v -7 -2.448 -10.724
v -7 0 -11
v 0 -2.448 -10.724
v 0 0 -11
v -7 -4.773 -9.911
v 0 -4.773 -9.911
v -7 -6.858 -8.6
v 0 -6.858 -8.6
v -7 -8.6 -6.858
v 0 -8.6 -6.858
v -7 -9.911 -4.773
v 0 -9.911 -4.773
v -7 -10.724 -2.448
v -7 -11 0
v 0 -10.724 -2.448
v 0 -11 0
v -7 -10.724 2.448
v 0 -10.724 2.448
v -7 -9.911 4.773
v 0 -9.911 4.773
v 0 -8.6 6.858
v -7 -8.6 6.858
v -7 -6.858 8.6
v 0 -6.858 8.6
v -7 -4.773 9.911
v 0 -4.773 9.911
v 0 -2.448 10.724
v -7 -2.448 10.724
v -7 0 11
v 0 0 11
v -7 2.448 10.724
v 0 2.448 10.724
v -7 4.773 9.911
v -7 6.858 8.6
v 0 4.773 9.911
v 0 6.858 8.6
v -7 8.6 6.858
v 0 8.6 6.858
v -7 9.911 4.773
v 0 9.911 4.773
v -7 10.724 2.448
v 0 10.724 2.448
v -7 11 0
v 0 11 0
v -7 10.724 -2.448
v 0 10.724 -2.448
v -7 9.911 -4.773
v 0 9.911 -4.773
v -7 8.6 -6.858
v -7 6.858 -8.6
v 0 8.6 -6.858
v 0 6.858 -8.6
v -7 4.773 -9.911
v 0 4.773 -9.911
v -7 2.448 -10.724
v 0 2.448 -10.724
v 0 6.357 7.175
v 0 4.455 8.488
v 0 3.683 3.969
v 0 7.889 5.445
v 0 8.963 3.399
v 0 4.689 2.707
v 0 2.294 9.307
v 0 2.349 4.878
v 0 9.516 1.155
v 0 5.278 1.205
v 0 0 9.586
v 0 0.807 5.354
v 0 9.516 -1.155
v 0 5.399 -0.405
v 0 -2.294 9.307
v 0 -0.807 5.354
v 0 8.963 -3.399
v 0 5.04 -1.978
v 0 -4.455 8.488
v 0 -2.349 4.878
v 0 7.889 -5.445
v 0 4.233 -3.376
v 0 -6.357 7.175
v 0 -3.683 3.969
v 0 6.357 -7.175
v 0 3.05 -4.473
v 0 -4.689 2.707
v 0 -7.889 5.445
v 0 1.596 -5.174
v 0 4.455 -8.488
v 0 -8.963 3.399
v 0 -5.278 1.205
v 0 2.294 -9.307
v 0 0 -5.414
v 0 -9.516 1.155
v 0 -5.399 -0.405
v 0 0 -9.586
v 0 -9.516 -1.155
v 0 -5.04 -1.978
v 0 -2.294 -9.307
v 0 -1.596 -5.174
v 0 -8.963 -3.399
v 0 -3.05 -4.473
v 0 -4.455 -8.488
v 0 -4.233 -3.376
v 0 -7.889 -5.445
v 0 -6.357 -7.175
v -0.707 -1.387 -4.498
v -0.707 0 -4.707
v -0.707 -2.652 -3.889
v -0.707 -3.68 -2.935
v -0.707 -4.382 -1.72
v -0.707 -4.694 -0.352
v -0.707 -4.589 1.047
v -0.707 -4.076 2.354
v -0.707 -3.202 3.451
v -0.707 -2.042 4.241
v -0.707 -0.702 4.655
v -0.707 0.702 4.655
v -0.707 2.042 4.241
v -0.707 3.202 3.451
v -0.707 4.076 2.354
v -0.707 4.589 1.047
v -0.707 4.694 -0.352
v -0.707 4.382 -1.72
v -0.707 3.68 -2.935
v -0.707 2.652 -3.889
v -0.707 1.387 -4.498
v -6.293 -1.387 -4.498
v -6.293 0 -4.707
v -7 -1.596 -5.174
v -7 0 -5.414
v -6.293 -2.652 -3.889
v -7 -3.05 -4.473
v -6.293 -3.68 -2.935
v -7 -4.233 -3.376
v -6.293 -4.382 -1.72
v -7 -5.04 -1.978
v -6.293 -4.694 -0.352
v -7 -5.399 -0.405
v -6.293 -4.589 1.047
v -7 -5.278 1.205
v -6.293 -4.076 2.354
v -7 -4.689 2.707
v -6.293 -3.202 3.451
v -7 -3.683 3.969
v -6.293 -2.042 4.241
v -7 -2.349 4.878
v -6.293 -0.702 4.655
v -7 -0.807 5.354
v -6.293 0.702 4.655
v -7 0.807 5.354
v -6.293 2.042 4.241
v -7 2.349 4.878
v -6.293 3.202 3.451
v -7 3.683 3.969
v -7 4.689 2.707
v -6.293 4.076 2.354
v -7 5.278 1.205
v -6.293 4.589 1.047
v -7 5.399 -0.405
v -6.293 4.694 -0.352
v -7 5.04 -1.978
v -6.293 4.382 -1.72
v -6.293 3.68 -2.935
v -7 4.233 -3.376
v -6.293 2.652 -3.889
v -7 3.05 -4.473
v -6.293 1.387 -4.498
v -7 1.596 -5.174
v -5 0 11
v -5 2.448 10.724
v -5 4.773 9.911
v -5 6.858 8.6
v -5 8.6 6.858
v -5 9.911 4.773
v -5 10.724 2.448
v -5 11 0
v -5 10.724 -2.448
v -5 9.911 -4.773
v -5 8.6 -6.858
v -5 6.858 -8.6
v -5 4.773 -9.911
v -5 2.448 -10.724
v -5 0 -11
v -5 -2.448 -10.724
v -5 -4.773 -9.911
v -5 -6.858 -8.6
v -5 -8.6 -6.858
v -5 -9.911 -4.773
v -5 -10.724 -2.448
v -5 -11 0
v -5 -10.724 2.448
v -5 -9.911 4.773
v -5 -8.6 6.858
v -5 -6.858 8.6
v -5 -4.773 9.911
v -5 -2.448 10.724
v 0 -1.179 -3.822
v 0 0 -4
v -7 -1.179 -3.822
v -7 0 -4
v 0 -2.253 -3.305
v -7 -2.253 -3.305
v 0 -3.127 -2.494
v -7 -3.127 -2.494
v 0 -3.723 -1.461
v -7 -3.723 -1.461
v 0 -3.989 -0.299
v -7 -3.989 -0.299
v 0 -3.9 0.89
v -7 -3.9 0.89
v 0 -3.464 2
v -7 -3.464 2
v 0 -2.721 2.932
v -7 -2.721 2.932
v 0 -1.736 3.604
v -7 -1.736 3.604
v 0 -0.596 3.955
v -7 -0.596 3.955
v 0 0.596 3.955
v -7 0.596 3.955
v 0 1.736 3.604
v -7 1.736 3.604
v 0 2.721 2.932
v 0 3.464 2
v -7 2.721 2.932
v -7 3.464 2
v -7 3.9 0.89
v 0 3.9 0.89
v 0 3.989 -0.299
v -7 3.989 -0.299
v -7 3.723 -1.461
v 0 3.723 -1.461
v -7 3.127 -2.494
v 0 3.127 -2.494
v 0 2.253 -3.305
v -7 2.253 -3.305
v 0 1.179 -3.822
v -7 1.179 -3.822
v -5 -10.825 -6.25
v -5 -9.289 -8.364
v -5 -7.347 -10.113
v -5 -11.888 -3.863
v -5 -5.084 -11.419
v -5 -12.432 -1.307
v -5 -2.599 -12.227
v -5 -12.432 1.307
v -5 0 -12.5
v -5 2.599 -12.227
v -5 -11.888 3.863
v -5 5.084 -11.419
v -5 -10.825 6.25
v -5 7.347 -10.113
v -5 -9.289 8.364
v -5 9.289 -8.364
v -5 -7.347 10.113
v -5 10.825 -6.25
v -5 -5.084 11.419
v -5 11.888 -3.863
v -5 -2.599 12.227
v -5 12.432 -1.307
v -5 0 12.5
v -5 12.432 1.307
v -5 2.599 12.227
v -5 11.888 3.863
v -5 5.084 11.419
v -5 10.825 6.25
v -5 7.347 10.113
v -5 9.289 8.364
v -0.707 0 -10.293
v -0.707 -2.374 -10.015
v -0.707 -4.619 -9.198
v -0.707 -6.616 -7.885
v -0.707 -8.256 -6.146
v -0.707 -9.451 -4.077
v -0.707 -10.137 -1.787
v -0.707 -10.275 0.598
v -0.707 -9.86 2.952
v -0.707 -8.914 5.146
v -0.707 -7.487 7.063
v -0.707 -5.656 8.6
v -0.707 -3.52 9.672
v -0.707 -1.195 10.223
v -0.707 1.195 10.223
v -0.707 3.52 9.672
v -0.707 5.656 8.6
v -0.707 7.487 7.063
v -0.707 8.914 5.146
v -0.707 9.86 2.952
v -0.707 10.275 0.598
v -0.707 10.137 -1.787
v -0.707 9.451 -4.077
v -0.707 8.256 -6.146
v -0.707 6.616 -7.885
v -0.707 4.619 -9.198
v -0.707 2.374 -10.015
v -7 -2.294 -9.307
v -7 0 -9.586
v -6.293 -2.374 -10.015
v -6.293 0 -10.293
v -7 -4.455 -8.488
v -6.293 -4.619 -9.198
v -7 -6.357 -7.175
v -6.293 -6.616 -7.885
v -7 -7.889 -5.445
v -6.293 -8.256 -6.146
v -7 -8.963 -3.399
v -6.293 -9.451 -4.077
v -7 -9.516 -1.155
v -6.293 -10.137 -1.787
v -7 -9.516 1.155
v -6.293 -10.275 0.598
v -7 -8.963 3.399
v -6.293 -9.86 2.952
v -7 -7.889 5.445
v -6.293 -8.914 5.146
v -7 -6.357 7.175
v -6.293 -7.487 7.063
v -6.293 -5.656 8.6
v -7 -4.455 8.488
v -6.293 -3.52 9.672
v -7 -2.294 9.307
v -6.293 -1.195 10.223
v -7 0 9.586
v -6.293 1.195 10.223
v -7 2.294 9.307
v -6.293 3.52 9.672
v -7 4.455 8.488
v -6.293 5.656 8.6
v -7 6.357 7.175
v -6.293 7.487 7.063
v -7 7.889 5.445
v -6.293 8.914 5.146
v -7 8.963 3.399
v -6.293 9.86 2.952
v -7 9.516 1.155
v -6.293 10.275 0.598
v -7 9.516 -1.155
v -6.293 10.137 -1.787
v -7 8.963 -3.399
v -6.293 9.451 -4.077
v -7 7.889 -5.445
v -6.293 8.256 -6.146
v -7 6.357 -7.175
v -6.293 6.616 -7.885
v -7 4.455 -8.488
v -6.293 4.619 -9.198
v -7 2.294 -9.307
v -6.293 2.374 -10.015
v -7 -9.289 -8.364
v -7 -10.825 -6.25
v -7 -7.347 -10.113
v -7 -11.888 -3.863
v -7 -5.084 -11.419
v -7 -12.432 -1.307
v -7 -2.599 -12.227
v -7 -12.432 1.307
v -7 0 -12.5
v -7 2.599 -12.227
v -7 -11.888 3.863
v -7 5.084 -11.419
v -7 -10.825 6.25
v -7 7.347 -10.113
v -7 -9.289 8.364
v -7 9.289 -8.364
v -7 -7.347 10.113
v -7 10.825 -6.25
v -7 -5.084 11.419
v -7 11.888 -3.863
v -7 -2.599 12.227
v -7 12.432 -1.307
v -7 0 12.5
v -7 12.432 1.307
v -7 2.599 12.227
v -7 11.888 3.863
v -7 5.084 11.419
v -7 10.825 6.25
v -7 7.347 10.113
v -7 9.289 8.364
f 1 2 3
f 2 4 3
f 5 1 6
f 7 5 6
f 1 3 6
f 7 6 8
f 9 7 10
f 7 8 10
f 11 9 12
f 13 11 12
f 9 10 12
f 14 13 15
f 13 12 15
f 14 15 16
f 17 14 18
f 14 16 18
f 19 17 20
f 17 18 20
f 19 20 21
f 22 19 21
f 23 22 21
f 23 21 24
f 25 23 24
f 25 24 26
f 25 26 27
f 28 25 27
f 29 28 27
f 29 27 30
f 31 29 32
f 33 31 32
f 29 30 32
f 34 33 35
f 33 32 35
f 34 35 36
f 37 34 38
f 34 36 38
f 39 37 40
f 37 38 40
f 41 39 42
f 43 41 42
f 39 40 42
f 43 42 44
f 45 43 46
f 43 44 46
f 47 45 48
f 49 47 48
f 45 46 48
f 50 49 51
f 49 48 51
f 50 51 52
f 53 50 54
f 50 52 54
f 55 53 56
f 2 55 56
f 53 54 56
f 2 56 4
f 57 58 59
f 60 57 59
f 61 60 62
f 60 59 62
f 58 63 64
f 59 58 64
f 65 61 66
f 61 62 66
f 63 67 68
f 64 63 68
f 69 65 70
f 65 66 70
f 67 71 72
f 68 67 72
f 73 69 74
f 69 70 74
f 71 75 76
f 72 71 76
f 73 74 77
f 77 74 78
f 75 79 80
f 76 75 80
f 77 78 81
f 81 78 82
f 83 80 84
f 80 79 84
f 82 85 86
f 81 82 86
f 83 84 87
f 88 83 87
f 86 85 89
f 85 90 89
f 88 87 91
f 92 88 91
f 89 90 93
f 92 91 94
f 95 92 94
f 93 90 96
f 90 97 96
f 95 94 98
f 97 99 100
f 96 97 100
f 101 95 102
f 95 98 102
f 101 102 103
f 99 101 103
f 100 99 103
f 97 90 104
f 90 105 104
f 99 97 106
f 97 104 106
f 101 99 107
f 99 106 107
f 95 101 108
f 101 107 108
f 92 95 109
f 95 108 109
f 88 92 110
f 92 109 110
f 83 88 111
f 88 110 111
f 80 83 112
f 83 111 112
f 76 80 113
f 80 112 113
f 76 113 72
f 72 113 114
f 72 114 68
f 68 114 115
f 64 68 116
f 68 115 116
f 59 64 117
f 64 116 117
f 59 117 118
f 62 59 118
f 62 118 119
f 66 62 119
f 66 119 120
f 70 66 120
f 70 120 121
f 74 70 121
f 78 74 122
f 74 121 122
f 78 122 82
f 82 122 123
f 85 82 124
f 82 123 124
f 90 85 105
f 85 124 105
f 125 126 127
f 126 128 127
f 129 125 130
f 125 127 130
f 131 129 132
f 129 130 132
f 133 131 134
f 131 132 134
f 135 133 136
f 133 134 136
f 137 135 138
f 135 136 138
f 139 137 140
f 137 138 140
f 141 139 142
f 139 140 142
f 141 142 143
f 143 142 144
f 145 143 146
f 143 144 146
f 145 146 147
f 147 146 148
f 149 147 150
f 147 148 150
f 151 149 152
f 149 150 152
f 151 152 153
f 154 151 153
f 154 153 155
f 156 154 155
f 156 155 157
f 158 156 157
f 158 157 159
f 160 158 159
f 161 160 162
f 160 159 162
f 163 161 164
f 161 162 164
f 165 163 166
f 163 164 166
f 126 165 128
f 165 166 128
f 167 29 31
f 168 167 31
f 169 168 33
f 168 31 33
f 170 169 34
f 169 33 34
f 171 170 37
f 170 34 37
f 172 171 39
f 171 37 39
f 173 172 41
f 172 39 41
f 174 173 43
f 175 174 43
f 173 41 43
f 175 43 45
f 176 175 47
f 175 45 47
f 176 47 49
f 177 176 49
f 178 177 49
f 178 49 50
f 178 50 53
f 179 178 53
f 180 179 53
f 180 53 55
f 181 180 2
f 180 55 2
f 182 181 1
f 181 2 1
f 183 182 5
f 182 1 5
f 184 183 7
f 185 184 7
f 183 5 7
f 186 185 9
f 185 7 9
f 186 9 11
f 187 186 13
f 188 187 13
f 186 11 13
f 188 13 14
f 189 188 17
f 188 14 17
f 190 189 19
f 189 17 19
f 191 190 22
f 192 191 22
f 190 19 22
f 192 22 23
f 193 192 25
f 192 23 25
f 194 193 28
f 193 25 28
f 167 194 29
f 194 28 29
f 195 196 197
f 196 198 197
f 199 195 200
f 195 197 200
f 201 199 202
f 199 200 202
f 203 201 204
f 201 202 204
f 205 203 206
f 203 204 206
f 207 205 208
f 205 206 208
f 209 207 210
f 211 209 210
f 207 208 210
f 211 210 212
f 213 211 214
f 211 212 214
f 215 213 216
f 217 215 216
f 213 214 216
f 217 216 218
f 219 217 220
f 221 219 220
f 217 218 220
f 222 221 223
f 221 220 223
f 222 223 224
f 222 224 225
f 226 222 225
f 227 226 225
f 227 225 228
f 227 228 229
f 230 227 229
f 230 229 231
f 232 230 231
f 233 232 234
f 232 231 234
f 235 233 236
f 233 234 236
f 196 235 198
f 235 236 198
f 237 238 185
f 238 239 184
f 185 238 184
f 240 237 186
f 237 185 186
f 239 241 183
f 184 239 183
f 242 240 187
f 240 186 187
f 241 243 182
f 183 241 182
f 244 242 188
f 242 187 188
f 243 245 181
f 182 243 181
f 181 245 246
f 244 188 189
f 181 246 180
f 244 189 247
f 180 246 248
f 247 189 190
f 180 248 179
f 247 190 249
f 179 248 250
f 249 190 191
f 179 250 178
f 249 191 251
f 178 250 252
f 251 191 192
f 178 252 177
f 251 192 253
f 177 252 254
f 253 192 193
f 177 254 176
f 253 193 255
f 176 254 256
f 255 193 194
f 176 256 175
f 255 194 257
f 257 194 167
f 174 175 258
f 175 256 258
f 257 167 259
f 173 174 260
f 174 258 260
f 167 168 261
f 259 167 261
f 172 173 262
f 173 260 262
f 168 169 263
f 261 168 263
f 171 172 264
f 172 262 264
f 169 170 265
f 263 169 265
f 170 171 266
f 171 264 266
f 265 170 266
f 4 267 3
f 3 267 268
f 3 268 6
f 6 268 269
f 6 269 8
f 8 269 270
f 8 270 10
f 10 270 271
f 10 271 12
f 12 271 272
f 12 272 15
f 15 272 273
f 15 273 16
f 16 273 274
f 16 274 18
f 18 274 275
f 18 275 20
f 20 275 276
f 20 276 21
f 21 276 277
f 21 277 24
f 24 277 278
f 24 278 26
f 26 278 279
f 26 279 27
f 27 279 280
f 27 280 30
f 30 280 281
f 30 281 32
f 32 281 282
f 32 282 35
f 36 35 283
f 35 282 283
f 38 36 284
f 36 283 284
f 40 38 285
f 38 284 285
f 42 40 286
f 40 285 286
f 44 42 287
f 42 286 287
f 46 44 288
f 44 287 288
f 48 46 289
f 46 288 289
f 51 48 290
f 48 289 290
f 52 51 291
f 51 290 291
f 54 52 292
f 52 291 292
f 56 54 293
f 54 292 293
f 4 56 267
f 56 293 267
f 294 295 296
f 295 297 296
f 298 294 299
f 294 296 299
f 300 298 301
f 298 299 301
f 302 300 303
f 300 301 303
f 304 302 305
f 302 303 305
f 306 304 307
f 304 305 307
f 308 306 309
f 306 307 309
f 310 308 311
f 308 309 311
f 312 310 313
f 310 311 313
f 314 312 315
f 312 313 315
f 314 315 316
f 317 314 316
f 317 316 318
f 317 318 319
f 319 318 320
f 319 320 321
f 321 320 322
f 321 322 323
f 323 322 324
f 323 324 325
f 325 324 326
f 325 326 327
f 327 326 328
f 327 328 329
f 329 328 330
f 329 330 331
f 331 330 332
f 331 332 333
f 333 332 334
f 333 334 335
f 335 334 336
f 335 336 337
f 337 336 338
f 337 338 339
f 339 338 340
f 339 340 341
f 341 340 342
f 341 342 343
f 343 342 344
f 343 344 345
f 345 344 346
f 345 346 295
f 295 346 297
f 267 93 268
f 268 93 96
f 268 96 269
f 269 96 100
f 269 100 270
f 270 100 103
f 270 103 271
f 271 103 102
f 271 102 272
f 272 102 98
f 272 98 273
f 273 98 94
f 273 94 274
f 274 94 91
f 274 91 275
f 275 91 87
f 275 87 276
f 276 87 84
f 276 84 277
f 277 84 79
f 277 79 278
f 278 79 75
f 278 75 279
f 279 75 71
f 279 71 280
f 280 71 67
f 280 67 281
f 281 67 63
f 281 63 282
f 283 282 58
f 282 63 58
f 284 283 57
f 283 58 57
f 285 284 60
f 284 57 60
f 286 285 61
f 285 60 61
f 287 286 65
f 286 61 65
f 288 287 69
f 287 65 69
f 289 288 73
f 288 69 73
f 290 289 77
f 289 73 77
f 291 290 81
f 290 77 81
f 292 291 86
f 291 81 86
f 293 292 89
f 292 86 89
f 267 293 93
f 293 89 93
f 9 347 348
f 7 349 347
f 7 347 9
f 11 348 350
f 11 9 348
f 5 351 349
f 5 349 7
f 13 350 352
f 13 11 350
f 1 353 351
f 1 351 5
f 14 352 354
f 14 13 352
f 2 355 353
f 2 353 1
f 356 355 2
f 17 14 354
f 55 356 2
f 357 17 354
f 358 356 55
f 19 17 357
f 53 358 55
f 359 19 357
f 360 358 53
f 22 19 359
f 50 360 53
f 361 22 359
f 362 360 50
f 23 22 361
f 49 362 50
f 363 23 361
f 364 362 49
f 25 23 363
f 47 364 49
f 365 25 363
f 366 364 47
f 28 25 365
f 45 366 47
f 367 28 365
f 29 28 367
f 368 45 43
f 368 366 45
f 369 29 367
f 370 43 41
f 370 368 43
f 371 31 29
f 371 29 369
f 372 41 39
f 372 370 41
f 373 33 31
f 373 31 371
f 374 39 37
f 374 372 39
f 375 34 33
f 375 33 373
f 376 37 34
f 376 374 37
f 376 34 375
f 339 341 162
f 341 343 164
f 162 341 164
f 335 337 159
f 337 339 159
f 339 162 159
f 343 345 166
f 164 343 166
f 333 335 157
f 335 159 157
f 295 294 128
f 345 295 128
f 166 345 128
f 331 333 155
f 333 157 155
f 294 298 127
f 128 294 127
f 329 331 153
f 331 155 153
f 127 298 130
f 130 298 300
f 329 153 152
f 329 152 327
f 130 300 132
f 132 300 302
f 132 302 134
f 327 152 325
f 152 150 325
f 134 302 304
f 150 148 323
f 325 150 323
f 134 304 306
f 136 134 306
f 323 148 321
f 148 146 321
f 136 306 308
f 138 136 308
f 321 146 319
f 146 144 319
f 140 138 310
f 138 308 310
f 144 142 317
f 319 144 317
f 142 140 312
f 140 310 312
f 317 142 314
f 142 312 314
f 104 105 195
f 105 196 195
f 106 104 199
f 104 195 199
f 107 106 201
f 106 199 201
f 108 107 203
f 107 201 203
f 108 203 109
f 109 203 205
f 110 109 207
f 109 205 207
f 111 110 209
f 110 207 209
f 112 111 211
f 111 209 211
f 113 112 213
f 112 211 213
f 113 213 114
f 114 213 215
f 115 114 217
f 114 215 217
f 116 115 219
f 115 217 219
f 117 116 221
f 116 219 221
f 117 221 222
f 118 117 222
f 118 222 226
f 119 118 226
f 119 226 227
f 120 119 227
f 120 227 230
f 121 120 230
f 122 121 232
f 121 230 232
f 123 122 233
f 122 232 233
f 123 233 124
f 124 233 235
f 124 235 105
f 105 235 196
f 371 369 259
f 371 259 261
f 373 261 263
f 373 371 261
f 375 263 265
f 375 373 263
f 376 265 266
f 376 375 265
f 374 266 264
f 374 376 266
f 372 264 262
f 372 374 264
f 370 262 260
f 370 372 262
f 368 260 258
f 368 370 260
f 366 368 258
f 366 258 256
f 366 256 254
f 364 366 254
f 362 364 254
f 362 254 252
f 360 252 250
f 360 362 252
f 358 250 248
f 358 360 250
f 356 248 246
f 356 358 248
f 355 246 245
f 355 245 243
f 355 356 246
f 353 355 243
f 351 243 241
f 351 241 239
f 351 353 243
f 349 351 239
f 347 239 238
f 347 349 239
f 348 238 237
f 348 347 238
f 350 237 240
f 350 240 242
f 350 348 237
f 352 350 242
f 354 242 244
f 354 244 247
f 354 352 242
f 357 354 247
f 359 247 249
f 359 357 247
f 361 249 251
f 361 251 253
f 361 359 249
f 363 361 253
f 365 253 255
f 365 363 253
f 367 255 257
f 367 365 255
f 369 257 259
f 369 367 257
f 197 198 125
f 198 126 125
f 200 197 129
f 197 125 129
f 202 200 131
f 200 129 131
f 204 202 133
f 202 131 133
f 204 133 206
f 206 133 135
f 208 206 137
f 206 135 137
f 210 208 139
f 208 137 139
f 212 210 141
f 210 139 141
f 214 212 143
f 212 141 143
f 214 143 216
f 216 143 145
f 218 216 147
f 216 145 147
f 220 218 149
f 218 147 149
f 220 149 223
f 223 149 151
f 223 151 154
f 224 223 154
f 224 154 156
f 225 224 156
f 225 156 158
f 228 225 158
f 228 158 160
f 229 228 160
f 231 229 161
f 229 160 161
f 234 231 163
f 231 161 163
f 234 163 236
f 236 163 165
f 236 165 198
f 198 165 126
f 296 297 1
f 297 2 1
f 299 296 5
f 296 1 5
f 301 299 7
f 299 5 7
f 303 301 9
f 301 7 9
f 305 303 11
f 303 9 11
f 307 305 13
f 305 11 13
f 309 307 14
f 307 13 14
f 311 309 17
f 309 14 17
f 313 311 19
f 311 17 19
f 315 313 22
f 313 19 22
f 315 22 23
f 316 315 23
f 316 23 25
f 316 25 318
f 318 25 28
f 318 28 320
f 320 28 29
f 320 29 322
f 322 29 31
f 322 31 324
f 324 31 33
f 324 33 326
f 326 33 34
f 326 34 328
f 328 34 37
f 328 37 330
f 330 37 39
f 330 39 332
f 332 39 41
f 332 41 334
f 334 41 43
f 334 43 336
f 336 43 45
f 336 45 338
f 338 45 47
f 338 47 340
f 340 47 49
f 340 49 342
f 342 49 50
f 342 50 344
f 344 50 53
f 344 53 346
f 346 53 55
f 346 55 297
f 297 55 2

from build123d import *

# Parameters (mm, degrees)
SKETCH_2_R      = 12.5
SKETCH_2_R_2    = 11
EXTRUDE_1_DEPTH = 2


with BuildPart() as part:
    # 草图1 → 旋转1 (revolve)
    with BuildSketch(Plane(origin=(0, 0, 0), x_dir=(1, 0, 0), z_dir=(0, 1, 0)), mode=Mode.PRIVATE) as revolve_1_sk:
        Polygon((0, -4), (-7, -4), (-6.292893219, -4.707106781), (-7, -5.414213562), (-7, -9.585786438), (-6.292893219, -10.292893219), (-7, -11), (0, -11), (-0.707106781, -10.292893219), (0, -9.585786438), (0, -5.414213562), (-0.707106781, -4.707106781), align=None)
    revolve(revolve_1_sk.sketch.rotate(Axis((0, 0, 0), (-1, 0, 0)), 180), axis=Axis((0, 0, 0), (-1, 0, 0)))


with BuildPart() as body_2:
    # 草图2 → 凸台-拉伸1 (new body)
    with BuildSketch(Plane.ZY.offset(7)):
        Circle(SKETCH_2_R)
        Circle(SKETCH_2_R_2, mode=Mode.SUBTRACT)
    extrude(amount=-EXTRUDE_1_DEPTH)


solid = Compound([part.part, body_2.part])
